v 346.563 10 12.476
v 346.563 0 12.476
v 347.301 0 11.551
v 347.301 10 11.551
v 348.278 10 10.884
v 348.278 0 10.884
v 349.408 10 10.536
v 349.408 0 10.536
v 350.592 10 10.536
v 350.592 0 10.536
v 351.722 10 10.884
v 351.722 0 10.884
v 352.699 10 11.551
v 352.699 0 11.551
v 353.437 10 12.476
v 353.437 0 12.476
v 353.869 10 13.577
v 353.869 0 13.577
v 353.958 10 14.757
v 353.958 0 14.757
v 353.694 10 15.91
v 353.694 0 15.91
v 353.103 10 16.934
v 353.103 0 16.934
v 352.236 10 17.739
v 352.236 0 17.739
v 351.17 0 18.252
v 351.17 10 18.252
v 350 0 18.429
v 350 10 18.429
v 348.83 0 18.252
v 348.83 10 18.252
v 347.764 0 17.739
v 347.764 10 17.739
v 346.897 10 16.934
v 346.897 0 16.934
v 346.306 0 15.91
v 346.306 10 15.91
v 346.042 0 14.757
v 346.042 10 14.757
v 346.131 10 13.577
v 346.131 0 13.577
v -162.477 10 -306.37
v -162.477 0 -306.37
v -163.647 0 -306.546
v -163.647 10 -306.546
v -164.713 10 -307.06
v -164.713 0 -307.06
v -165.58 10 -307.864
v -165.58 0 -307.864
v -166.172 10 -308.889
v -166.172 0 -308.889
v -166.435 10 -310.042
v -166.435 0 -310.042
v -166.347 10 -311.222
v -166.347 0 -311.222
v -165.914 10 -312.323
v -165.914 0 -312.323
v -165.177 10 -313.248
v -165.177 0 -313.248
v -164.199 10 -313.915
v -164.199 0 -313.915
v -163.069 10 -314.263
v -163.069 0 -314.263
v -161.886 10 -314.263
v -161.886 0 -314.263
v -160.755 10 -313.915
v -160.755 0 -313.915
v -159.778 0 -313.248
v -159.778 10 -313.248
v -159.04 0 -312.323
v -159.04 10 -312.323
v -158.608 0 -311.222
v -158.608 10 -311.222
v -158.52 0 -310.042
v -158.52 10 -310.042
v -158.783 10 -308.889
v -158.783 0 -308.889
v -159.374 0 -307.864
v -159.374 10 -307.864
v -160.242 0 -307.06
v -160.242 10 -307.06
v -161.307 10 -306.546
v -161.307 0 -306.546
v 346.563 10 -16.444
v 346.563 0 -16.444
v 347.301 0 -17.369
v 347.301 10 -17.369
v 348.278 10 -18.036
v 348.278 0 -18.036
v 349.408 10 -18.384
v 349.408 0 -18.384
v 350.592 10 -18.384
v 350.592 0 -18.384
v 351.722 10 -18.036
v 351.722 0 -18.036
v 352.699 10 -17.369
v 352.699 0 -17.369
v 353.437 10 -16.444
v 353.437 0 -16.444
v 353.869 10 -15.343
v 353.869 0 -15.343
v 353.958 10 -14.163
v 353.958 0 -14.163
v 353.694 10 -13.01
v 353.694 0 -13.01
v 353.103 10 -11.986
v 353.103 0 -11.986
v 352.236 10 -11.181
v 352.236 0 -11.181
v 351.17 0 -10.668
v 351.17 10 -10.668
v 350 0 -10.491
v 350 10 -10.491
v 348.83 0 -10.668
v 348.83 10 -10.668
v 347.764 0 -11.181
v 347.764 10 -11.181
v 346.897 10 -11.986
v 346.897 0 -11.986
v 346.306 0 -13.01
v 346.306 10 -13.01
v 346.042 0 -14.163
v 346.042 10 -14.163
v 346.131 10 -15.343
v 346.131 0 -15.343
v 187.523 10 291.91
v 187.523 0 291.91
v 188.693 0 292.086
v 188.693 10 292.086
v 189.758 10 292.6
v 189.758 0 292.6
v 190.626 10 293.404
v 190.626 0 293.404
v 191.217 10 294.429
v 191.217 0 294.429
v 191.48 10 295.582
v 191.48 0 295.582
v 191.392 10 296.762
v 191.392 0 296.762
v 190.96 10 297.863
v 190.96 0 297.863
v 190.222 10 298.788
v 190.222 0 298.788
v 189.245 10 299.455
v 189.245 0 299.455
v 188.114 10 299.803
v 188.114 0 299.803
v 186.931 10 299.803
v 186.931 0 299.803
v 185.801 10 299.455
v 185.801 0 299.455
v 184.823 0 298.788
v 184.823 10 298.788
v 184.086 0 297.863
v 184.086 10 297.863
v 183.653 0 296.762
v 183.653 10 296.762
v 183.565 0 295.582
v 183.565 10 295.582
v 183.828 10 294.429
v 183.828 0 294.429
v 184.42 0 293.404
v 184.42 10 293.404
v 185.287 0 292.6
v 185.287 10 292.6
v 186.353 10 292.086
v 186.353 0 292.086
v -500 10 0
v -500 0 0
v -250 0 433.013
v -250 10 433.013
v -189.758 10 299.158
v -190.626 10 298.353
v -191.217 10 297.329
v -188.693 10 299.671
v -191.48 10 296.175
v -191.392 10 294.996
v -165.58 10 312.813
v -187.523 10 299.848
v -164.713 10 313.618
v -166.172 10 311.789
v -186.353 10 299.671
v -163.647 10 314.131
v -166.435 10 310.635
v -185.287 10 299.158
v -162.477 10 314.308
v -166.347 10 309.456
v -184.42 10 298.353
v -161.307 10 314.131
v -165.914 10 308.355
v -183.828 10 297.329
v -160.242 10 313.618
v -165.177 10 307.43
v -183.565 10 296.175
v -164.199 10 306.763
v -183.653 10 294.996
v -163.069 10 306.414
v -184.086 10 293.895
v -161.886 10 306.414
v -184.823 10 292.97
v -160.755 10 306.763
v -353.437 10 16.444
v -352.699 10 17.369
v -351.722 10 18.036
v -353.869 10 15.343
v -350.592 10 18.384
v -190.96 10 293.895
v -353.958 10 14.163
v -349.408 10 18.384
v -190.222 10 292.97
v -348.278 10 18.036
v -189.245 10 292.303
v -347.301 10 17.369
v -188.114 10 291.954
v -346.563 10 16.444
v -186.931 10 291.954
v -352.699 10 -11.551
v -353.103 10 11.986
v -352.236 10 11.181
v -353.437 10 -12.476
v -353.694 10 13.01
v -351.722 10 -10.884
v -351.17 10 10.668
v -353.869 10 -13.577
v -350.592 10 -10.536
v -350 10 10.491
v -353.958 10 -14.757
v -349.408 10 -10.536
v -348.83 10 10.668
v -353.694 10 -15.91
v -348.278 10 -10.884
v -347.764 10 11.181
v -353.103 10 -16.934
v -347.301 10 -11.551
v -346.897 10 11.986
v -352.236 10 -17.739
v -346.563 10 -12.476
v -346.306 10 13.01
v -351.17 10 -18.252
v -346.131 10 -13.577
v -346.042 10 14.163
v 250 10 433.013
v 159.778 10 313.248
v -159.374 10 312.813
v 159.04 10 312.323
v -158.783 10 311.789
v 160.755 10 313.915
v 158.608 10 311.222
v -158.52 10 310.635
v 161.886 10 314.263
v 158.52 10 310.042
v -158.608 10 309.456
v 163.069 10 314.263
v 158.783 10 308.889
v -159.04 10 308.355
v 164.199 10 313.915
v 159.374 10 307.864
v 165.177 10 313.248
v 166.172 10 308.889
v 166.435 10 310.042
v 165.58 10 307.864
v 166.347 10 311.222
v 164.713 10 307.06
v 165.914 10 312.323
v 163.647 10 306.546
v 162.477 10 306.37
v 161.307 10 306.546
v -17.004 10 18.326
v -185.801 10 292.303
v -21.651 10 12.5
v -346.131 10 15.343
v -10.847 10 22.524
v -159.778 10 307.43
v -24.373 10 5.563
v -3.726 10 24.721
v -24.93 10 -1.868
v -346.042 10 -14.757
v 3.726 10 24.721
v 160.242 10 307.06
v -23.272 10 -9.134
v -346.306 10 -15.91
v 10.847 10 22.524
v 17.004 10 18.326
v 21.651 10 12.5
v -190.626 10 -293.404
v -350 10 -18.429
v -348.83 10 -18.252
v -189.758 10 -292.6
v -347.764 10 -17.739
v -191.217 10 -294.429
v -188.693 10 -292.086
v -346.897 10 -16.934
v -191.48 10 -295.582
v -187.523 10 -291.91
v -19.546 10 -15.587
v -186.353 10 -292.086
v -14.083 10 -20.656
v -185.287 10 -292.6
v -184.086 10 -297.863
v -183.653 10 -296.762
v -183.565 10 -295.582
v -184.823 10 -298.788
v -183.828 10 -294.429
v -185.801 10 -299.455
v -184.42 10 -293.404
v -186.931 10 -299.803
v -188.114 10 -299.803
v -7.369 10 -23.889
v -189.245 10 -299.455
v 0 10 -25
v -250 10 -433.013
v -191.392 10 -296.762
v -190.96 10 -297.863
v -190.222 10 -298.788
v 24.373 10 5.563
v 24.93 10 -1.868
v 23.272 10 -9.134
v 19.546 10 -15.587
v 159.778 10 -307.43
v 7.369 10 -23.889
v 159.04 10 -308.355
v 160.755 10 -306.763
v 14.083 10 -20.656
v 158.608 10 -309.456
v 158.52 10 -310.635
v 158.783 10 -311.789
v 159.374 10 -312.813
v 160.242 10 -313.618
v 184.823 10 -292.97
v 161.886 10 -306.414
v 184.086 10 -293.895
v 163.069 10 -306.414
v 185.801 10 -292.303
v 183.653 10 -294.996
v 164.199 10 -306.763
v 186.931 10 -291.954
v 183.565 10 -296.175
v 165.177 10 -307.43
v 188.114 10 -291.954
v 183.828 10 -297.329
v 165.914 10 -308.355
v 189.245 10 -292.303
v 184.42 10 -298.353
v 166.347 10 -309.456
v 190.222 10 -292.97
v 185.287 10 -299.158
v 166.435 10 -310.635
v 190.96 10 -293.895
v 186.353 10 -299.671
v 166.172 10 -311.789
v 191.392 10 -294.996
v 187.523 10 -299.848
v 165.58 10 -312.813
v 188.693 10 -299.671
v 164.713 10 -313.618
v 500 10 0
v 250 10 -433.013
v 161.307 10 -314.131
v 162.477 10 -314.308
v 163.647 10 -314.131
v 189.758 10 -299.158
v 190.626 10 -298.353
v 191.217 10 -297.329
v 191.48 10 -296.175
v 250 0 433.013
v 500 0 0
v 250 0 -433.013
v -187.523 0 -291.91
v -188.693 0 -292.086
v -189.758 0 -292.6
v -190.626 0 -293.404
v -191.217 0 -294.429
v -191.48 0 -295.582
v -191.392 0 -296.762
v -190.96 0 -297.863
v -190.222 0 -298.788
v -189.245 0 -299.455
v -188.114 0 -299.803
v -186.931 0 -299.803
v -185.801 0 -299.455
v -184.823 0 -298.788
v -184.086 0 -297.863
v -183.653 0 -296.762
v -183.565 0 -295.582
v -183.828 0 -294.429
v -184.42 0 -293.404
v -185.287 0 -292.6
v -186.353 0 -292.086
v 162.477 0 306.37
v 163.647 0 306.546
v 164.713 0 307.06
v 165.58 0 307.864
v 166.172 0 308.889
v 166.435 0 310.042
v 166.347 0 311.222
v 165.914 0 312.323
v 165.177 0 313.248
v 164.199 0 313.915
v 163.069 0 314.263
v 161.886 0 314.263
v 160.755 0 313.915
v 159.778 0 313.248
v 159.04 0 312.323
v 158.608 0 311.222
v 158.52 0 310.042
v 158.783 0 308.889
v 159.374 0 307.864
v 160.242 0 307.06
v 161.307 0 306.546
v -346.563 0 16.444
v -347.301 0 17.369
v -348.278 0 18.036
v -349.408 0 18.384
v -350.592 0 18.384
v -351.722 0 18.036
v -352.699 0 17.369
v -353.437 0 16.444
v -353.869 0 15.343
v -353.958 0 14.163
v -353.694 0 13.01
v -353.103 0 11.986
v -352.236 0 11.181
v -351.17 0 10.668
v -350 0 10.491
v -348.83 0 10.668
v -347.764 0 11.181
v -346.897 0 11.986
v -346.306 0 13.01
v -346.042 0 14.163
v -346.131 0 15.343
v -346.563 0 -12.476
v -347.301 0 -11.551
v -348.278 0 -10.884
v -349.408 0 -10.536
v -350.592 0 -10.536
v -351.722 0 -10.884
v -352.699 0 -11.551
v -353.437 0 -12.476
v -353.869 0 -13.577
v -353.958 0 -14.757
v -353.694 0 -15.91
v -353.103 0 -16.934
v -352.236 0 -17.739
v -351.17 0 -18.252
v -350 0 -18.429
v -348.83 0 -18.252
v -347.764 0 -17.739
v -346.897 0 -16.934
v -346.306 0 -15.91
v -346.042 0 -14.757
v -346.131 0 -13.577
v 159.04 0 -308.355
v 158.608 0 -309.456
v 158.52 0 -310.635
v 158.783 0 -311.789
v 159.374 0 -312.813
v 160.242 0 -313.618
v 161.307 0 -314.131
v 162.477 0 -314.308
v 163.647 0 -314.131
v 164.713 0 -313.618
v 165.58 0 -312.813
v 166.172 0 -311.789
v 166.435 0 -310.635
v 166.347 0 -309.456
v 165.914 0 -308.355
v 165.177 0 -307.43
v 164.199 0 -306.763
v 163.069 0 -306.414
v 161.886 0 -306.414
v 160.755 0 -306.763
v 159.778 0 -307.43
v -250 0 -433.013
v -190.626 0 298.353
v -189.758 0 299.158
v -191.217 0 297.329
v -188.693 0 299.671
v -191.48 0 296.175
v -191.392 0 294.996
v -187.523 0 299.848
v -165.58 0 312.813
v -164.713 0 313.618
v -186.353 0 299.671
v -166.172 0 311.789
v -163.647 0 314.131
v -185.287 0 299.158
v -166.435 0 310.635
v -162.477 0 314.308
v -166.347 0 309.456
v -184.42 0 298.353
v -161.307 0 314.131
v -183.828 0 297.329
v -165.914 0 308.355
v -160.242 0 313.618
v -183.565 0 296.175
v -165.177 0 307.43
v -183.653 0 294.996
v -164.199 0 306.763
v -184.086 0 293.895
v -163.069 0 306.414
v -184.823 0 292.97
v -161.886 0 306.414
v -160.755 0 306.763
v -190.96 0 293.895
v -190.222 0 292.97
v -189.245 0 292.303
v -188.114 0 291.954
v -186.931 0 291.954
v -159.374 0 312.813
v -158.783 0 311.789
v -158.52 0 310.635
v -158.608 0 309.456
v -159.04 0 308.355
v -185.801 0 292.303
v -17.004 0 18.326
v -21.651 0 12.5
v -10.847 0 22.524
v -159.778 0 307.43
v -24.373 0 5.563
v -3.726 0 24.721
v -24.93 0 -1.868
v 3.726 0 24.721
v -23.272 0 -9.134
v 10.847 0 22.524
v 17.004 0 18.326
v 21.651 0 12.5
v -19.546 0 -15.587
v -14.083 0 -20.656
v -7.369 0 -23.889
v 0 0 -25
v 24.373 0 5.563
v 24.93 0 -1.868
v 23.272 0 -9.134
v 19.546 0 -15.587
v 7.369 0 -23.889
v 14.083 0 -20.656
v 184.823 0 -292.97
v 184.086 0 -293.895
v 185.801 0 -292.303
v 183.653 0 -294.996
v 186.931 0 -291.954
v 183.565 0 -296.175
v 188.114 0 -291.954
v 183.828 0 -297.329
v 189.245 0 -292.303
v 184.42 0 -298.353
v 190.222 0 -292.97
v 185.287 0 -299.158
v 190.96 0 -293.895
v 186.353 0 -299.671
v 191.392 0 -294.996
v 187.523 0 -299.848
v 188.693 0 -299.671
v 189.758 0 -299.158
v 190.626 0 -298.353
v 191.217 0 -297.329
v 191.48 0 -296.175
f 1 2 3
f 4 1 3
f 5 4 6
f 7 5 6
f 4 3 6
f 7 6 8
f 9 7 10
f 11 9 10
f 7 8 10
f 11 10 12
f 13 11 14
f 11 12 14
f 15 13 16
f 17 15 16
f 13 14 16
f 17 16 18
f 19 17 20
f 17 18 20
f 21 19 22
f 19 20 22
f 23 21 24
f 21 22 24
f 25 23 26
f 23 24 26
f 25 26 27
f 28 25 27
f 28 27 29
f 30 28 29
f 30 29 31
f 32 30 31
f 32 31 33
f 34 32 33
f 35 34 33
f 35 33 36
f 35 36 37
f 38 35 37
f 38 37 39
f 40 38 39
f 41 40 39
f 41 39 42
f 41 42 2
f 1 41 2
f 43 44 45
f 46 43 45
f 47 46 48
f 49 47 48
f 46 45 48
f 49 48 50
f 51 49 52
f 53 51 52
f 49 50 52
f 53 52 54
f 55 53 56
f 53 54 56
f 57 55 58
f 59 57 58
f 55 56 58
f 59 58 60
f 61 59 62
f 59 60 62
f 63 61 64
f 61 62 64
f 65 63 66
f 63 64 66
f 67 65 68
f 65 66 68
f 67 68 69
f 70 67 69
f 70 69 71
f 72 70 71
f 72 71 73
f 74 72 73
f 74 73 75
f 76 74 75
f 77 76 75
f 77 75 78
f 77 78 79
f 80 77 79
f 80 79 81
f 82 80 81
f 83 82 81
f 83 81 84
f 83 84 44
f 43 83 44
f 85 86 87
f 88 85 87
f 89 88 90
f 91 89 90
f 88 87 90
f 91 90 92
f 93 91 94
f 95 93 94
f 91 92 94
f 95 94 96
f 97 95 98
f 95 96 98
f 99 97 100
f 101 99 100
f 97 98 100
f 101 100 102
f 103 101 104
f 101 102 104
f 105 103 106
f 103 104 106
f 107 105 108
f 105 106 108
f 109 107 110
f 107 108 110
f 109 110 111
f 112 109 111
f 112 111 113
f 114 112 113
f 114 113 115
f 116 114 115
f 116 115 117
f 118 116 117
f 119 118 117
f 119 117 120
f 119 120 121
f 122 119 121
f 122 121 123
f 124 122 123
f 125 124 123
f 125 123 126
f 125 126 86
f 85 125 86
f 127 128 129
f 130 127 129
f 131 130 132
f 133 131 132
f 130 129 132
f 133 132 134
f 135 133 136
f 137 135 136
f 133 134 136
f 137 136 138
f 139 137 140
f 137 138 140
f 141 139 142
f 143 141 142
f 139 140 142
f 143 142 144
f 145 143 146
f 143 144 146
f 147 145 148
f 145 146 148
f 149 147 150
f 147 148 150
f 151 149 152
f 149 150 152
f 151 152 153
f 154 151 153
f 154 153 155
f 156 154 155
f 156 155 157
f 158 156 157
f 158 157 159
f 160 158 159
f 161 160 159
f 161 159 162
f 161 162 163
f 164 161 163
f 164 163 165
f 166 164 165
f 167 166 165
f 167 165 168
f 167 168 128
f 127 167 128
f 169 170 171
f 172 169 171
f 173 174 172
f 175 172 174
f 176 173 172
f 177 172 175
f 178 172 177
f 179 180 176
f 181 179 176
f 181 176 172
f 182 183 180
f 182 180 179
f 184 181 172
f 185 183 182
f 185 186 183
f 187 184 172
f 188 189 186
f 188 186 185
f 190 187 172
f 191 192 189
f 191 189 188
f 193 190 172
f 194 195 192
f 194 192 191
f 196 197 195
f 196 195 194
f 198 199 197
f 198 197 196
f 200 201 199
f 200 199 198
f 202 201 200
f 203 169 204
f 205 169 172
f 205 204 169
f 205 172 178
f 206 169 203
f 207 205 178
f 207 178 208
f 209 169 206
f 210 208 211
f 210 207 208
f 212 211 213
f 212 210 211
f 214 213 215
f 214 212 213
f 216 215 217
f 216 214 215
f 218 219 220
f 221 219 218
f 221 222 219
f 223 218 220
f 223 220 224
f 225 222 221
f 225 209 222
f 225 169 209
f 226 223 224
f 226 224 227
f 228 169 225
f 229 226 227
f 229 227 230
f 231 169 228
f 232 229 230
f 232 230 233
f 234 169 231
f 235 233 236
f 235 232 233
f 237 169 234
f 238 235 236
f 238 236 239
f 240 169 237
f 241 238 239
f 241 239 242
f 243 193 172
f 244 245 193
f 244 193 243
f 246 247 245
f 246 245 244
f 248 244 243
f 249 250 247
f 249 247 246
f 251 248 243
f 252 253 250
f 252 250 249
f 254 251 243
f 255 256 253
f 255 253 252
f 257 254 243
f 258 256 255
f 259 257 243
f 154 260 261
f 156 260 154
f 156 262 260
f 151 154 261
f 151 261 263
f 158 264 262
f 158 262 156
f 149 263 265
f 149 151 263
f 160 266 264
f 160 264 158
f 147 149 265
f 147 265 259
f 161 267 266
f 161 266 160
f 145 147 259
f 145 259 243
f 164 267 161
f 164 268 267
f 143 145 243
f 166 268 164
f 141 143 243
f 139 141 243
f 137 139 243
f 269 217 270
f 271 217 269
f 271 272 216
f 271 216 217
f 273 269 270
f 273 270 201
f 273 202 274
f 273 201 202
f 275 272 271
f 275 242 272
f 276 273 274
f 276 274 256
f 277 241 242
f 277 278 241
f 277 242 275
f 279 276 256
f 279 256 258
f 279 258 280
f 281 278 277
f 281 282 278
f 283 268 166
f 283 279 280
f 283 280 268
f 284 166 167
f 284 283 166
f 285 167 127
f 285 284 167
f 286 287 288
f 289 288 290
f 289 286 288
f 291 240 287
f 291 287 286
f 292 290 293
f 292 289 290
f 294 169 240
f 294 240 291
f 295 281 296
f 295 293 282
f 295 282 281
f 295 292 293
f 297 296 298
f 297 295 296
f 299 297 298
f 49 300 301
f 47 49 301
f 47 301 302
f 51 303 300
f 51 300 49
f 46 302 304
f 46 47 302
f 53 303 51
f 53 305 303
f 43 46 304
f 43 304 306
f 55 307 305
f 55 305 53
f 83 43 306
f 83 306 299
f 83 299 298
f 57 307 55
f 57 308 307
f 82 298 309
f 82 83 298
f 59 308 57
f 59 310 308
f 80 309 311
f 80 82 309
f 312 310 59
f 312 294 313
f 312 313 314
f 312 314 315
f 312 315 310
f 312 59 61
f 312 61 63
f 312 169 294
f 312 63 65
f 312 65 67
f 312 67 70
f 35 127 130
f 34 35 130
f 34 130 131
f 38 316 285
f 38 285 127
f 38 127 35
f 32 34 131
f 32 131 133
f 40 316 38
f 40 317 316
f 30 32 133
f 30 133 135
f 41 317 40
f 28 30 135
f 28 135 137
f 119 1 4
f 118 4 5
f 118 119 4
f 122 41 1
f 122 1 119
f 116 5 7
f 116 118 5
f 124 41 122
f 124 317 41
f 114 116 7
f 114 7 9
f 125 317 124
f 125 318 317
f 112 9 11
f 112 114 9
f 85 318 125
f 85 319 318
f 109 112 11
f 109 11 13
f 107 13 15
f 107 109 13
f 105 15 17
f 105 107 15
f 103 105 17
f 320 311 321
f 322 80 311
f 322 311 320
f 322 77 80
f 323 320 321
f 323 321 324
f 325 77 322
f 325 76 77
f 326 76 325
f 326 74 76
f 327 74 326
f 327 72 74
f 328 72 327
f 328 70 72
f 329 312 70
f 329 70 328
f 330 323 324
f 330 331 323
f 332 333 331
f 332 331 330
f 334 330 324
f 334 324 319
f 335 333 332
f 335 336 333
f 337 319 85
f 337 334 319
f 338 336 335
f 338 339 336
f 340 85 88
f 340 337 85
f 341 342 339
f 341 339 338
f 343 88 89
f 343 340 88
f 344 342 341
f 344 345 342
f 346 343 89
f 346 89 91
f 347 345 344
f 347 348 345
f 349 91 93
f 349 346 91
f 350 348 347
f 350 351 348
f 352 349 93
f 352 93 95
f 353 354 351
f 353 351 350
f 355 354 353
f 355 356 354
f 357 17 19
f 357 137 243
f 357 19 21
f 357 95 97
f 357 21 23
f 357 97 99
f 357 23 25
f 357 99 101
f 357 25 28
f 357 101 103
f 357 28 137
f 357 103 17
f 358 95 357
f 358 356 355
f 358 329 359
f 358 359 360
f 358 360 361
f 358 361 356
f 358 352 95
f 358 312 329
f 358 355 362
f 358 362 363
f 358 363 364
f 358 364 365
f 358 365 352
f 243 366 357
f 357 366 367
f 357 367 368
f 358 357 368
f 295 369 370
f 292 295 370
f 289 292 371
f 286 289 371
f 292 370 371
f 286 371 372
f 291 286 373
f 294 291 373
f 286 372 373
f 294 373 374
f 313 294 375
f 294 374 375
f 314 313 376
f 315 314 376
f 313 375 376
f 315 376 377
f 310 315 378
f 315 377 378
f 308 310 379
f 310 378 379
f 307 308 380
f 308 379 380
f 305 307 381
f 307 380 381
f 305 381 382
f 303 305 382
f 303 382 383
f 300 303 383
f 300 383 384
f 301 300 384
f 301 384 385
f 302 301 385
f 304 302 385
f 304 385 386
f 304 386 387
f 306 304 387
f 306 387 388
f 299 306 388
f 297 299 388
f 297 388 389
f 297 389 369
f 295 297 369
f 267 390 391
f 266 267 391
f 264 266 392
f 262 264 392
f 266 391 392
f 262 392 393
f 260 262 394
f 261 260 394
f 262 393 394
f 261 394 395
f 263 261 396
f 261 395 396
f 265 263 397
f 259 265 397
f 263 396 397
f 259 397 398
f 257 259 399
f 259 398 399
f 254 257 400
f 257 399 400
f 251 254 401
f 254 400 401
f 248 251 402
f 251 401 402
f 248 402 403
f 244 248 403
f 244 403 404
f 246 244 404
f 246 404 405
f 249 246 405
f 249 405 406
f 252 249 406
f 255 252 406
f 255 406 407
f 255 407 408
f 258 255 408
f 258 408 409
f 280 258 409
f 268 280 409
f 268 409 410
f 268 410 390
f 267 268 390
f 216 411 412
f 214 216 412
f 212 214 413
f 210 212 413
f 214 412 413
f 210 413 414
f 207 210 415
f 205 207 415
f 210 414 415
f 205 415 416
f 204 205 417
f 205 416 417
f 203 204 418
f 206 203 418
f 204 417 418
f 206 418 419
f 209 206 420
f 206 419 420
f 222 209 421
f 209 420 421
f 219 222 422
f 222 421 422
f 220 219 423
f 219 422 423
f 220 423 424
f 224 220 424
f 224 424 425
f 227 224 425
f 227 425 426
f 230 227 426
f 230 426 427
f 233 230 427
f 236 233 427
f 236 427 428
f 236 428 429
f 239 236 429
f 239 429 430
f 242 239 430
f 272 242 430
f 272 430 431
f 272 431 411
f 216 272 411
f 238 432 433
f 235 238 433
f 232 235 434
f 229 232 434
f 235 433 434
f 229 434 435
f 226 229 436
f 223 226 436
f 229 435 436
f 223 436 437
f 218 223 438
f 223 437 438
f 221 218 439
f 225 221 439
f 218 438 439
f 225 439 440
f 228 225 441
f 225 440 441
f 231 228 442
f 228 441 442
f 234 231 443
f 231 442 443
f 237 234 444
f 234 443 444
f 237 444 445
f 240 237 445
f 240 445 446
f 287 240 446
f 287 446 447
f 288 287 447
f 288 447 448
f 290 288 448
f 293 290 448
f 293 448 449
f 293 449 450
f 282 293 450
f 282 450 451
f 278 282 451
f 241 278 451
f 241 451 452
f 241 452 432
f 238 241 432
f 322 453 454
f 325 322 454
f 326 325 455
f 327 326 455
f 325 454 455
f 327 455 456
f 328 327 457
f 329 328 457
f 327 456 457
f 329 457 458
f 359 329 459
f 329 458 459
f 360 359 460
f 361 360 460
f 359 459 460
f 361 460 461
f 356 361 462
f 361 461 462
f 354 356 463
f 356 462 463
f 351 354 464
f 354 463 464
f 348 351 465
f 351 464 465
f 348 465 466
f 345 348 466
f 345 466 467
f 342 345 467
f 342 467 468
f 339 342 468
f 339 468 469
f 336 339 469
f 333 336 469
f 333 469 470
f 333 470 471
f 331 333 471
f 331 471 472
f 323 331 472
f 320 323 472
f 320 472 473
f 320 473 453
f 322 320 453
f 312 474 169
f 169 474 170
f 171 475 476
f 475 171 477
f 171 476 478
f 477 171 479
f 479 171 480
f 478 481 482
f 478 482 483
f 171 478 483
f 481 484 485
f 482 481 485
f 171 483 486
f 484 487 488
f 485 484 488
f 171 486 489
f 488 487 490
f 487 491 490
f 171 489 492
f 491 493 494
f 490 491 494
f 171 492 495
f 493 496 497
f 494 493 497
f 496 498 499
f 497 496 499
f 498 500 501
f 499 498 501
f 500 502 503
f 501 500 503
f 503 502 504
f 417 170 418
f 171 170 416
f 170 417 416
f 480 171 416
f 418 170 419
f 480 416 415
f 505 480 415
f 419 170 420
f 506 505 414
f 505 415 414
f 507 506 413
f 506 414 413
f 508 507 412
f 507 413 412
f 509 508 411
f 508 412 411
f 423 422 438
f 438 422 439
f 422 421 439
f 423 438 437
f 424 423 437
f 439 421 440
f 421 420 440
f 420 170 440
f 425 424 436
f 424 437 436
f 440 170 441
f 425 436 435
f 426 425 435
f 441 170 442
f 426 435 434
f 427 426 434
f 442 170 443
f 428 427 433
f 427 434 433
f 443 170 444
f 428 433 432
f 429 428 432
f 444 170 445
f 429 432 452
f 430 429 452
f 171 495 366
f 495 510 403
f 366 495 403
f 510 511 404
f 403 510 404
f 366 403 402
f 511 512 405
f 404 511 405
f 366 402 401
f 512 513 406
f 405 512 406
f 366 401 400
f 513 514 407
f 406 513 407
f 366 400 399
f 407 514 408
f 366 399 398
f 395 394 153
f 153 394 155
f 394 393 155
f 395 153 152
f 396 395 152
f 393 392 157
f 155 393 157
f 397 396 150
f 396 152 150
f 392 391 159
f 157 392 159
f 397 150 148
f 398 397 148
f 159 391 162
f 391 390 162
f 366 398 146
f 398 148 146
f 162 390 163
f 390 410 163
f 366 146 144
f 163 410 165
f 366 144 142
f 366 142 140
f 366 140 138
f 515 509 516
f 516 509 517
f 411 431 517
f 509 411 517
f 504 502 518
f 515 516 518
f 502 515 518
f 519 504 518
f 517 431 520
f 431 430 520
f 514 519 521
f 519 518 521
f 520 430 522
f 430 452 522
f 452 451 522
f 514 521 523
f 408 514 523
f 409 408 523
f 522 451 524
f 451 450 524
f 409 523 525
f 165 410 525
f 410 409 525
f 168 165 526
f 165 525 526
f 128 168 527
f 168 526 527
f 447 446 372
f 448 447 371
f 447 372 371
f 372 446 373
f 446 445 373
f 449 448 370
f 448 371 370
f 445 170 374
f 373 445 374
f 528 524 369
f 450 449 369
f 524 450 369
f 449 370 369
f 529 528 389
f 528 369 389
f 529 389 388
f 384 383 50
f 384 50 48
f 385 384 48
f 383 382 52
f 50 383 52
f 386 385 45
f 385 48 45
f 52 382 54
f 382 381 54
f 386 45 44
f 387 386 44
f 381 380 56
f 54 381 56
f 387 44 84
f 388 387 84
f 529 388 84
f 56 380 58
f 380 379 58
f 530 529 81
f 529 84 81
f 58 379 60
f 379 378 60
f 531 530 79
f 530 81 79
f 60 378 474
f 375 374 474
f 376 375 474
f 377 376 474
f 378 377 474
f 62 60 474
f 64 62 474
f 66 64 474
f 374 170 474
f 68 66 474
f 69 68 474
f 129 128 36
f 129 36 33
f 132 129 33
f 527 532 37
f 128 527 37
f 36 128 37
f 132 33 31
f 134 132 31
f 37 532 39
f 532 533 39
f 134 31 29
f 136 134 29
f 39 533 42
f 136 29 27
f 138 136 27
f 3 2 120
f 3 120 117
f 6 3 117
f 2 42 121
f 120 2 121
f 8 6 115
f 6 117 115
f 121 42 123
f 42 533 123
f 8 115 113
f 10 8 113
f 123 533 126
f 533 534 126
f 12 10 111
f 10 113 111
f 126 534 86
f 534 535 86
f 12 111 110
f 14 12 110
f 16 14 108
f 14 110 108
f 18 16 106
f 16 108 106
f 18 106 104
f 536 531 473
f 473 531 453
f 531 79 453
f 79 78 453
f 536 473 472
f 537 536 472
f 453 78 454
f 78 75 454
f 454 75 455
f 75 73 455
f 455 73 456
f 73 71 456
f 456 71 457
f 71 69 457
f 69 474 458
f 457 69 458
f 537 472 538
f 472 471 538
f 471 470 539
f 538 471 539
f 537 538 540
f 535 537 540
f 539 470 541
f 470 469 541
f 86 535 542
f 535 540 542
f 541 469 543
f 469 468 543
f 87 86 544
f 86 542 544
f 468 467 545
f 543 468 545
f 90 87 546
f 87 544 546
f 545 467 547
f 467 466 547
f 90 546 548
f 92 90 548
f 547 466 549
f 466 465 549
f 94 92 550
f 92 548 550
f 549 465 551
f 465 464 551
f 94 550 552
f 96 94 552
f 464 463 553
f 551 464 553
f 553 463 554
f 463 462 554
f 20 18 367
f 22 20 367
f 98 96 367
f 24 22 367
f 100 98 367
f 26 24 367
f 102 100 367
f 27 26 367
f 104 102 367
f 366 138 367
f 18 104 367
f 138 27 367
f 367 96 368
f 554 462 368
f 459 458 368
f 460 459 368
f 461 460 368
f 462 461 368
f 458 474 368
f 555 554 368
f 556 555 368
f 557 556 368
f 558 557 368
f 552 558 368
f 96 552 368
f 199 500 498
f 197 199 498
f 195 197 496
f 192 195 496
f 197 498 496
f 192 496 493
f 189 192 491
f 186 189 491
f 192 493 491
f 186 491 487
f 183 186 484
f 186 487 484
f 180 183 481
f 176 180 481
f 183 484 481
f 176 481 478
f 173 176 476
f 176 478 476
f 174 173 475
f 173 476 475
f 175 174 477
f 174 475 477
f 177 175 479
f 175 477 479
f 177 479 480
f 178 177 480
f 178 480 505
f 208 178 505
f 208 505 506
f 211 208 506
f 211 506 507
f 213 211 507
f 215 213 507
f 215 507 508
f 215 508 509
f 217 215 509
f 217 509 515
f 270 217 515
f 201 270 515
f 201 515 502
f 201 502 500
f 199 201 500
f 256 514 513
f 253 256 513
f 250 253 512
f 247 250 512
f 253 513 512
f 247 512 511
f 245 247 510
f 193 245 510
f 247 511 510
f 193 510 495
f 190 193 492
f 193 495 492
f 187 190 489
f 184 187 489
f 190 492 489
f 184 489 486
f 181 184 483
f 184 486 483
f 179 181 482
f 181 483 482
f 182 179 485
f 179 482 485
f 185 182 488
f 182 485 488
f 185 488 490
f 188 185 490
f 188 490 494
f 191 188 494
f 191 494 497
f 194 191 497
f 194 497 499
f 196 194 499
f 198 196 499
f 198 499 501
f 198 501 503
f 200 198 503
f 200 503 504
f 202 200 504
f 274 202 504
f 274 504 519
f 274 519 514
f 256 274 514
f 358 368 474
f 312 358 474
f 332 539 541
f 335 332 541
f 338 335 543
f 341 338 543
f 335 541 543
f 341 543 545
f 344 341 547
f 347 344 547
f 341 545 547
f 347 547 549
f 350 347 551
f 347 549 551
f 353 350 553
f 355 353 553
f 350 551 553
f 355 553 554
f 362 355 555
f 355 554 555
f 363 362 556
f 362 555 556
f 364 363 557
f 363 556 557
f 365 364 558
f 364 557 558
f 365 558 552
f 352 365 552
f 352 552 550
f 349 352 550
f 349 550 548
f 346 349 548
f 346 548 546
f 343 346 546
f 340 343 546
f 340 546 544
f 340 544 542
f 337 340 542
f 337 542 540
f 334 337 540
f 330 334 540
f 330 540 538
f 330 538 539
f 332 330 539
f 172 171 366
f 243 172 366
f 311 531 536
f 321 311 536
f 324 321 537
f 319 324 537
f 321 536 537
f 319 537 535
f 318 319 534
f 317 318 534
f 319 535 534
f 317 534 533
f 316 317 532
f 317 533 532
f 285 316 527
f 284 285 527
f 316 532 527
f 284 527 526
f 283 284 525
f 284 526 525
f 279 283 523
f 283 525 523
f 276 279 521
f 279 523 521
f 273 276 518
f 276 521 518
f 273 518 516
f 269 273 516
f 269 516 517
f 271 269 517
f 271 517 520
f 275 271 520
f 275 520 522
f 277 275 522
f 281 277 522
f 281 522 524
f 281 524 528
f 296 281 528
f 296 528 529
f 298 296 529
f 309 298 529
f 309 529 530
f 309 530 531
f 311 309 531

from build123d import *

# Parameters (mm, degrees)
BOSS_EXTRUDE1_DEPTH = 10
SKETCH3_R           = 3.96875
CUT_EXTRUDE1_DEPTH  = 662.513416342
SKETCH4_R           = 25
CUT_EXTRUDE2_DEPTH  = 662.513416342
CIRPATTERN2_COUNT   = 6


with BuildPart() as part:
    # Sketch1 → Boss-Extrude1 (new body)
    with BuildSketch(Plane(origin=(0, 0, 0), x_dir=(1, 0, 0), z_dir=(0, 1, 0))):
        Polygon((500, 0), (250, 433.012701892), (-250, 433.012701892), (-500, 0), (-250, -433.012701892), (250, -433.012701892), align=None)
    extrude(amount=BOSS_EXTRUDE1_DEPTH)

    # Sketch3 → Cut-Extrude1 (cut, through all)
    with BuildSketch(Plane.XZ):
        with Locations(Location((187.522727339, 295.878891325, 0), (0, 0, 270))):
            Circle(SKETCH3_R)
        with Locations(Location((162.477272661, 310.338891325, 0), (0, 0, 270))):
            Circle(SKETCH3_R)
    cut_extrude1 = extrude(amount=-CUT_EXTRUDE1_DEPTH, mode=Mode.SUBTRACT)

    # Sketch4 → Cut-Extrude2 (cut, through all)
    with BuildSketch(Plane.XZ):
        with Locations(Location((0, 0, 0), (0, 0, 270))):
            Circle(SKETCH4_R)
    extrude(amount=-CUT_EXTRUDE2_DEPTH, mode=Mode.SUBTRACT)

    # CirPattern2: Cut-Extrude1 ×6 about axis
    cirpattern2_axis = Axis((0, 0, 0), (0, 1, 0))
    for i in range(1, CIRPATTERN2_COUNT):
        add(cut_extrude1.rotate(cirpattern2_axis, i * 360 / CIRPATTERN2_COUNT), mode=Mode.SUBTRACT)


solid = part.part
